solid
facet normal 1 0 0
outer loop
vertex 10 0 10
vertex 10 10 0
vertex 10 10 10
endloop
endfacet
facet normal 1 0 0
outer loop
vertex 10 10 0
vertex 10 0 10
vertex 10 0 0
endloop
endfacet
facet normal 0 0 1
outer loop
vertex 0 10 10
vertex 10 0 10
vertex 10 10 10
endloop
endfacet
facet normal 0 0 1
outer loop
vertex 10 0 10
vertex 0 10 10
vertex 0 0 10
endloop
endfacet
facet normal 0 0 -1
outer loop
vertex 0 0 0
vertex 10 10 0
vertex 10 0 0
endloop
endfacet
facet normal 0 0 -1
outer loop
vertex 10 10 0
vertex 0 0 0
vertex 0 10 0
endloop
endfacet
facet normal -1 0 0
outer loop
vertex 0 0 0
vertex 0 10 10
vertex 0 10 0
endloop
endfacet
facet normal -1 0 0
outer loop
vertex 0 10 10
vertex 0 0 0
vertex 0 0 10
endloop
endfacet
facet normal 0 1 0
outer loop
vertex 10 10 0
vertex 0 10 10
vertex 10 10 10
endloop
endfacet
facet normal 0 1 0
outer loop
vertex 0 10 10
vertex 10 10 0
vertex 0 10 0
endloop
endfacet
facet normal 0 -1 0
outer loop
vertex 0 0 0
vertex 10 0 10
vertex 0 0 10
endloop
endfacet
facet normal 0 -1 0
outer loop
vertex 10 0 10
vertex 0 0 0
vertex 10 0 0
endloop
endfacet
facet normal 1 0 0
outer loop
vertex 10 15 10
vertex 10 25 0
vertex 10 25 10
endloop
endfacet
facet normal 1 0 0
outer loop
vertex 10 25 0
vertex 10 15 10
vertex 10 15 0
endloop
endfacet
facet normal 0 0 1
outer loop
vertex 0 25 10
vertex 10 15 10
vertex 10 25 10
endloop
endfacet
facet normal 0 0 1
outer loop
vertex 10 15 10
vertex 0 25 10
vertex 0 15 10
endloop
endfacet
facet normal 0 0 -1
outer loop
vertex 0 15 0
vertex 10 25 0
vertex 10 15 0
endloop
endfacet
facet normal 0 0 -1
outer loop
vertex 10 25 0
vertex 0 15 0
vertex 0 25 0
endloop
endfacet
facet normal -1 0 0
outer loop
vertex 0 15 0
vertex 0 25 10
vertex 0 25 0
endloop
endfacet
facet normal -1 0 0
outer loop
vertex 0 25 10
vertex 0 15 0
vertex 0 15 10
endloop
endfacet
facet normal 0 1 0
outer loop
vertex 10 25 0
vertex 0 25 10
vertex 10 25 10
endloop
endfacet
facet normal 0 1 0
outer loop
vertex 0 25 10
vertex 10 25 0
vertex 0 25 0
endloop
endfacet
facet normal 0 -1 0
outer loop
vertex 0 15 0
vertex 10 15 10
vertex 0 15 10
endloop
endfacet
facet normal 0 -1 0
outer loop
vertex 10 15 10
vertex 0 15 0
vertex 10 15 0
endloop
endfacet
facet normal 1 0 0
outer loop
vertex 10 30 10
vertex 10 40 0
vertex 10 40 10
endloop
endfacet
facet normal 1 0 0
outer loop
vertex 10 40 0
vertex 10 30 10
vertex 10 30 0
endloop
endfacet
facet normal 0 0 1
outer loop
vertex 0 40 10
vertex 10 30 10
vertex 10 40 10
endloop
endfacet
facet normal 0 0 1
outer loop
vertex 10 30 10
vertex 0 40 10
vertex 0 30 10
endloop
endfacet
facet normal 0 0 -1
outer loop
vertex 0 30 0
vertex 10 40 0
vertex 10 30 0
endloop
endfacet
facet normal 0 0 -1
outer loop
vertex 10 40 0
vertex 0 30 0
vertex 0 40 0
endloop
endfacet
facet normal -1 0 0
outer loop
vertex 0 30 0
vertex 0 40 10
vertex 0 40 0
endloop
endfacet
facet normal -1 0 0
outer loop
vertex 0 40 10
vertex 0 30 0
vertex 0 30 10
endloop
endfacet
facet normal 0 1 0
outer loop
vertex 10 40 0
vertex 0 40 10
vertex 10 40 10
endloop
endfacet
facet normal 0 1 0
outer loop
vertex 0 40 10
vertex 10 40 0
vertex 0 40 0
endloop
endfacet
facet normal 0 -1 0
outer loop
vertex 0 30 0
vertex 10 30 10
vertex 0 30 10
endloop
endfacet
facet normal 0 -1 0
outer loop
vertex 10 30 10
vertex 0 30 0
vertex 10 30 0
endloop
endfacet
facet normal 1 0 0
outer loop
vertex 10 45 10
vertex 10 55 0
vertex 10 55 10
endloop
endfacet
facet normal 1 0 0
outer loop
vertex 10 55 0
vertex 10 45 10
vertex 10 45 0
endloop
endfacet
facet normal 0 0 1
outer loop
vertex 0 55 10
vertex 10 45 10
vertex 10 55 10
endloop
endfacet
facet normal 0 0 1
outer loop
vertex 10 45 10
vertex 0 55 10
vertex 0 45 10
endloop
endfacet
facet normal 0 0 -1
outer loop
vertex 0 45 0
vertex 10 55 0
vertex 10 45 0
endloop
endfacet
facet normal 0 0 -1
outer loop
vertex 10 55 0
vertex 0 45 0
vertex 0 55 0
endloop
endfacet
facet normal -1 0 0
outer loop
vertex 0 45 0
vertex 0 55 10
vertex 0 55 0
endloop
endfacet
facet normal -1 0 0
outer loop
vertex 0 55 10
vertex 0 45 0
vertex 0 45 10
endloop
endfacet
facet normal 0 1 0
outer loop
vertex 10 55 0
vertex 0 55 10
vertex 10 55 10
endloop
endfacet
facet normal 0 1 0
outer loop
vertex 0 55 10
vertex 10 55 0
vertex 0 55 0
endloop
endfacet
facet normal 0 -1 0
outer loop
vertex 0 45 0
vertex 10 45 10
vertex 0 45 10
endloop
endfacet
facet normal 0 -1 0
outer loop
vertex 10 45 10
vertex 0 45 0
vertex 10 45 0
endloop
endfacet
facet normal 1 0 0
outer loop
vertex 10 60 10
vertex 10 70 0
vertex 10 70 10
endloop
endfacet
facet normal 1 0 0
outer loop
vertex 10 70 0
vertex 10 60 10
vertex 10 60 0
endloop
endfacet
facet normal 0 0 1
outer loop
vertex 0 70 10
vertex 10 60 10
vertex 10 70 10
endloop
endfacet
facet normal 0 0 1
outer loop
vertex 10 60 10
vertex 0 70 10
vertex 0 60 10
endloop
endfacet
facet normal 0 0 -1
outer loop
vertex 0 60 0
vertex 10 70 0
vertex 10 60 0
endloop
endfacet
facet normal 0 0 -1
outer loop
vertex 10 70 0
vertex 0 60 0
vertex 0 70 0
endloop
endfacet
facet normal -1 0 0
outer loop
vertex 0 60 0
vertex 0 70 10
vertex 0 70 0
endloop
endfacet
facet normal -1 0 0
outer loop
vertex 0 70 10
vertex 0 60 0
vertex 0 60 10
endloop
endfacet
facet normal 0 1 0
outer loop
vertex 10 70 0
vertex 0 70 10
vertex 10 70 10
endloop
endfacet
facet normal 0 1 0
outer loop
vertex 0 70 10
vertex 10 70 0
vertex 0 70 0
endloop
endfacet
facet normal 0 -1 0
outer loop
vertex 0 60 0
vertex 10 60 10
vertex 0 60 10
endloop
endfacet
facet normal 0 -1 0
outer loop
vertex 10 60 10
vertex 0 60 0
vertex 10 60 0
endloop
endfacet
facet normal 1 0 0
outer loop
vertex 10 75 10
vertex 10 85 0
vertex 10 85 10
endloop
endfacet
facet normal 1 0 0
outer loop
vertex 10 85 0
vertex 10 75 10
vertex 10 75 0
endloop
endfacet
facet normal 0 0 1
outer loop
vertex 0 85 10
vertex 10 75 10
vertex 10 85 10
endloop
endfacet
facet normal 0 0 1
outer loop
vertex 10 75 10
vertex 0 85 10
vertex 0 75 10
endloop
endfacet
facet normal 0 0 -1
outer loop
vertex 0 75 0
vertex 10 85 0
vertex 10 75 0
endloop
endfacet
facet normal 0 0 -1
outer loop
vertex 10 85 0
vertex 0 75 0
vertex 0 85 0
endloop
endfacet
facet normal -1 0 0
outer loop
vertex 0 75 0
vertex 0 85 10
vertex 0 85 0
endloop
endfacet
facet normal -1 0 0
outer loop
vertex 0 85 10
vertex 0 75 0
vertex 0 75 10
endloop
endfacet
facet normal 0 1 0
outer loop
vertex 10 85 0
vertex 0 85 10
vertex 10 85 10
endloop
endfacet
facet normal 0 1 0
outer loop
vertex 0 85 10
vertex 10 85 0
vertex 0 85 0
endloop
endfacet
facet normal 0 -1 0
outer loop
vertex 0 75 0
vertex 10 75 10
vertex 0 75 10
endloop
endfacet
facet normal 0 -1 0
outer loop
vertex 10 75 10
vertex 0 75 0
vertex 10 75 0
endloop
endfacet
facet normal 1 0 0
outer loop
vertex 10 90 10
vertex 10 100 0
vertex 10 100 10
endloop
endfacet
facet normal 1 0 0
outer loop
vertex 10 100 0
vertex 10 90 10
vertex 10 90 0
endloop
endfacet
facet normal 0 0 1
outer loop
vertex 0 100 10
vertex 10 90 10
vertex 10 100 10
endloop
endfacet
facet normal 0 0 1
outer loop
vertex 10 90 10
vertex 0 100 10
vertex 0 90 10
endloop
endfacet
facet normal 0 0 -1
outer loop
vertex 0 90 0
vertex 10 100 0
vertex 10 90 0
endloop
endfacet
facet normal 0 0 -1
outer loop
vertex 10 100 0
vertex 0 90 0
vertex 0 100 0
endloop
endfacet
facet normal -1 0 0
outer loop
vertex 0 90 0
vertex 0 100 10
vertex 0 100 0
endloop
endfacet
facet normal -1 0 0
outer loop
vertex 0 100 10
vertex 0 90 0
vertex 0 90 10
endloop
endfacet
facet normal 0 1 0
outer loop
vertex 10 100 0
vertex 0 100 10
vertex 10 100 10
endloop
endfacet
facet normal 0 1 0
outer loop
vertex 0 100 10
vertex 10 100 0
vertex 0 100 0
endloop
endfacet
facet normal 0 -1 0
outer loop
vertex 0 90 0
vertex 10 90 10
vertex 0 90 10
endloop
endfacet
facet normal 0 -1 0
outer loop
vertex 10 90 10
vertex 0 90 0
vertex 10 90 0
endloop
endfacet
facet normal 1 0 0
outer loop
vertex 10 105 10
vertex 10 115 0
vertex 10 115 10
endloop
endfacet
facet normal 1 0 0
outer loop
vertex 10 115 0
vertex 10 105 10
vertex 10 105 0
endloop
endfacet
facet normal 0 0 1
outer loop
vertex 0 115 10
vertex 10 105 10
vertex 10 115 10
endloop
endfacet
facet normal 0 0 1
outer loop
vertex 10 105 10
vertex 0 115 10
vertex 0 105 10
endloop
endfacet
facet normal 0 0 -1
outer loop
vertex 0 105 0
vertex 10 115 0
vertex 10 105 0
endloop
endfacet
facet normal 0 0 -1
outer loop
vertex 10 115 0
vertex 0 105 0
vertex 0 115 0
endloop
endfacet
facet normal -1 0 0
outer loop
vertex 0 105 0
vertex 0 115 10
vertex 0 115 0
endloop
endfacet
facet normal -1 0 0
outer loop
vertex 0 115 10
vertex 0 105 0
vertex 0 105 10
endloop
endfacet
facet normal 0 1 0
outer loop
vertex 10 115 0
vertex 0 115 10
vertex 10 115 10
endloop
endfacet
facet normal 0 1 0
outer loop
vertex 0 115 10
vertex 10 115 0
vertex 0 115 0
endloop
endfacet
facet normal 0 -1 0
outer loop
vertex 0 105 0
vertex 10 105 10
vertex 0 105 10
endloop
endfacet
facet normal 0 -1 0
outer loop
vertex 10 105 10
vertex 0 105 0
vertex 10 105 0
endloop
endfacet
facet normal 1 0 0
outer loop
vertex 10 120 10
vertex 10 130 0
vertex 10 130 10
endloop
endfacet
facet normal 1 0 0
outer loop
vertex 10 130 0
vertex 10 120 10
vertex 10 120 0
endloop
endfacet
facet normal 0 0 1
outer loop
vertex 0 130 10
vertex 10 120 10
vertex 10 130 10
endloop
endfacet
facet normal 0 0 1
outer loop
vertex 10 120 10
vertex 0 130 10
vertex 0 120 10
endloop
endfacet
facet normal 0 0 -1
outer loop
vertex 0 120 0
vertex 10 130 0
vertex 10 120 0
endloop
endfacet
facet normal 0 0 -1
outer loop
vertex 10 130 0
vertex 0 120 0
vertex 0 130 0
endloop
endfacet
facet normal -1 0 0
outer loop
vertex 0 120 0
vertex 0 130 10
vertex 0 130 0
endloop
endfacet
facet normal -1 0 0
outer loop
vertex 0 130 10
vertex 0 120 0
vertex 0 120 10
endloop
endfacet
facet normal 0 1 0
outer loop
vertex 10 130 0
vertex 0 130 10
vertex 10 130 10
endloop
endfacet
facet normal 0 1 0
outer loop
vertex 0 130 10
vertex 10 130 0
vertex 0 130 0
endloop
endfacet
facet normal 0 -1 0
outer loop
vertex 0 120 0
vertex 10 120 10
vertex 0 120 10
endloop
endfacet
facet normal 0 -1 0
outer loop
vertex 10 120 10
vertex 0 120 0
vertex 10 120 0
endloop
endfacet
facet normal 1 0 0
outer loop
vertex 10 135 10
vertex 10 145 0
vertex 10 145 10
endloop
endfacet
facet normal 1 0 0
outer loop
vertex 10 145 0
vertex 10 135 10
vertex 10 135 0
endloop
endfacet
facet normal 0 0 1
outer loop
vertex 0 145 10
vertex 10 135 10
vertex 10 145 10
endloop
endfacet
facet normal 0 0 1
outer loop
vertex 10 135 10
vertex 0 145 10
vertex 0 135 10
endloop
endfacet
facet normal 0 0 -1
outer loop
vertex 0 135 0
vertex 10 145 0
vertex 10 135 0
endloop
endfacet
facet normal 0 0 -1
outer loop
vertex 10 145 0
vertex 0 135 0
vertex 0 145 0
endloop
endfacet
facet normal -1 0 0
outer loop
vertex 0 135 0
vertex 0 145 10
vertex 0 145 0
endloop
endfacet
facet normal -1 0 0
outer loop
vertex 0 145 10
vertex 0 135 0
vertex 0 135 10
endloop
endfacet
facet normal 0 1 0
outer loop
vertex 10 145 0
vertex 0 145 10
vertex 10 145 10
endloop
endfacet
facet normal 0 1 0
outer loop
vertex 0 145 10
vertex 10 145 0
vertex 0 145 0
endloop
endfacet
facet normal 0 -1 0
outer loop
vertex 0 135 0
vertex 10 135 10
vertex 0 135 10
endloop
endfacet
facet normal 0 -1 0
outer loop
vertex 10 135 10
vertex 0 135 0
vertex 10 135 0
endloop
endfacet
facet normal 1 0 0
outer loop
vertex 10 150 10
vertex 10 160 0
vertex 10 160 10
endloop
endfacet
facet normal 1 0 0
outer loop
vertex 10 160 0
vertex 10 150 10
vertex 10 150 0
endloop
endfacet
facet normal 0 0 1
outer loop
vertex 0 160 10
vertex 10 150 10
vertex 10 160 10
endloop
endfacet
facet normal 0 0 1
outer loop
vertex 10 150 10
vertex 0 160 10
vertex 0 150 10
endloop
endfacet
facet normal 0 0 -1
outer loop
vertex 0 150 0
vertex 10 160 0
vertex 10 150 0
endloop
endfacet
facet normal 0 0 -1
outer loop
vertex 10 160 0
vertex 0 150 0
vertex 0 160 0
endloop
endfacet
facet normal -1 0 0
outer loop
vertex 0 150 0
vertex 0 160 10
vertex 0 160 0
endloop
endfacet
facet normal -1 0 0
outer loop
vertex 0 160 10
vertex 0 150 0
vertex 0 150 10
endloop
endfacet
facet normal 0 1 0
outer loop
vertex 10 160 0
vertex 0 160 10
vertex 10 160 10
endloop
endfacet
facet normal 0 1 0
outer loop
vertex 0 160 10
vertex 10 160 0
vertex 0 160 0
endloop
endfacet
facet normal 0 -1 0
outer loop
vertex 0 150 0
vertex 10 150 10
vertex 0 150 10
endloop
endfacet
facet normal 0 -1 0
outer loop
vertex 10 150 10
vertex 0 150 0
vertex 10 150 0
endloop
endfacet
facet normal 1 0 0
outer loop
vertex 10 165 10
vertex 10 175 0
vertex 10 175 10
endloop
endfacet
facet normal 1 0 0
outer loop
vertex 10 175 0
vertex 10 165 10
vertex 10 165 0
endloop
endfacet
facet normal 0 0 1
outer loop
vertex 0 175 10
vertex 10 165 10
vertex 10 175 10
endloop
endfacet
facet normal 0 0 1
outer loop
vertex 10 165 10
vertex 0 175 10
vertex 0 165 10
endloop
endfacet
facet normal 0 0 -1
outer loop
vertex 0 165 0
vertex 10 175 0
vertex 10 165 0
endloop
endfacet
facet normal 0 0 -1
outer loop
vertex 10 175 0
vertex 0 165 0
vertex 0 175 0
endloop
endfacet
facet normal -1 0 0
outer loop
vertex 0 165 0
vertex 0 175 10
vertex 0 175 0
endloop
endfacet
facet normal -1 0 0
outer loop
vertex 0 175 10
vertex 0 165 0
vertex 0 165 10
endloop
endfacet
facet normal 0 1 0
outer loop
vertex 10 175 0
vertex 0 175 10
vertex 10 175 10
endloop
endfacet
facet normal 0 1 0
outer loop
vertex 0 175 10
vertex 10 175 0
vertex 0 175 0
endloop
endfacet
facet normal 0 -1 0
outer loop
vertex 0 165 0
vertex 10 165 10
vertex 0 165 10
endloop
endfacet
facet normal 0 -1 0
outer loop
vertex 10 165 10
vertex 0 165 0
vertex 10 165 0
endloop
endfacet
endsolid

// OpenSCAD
// color scheme generator
// use customizer to select colors
// switch between perspective and 3d anaglyph to see what the colors look like
// copy and paste console output to /usr/share/openscad/color-schemes/render/redcyanglasses.json

// customizer variables

light_hue = 75; // [45:105]
dark_hue = 285; // [255:315]
saturation = 95; // [0:100]
dark_scheme = false;

module __end_of_customizer_variables__ () {}  // marks end of customizer variables

hue_front = dark_scheme ? dark_hue : light_hue;
hue_back = dark_scheme ? light_hue : dark_hue;
lightness_background = dark_scheme ? 0 : 100;

// color scheme.
// parameters to hsv_deg are hue [0:360], saturation [0:100] and value [0:100]

background         = hsv_deg(0, 0, lightness_background);
highlight          = hsv_deg(hue_back,saturation,100);
axes_color         = hsv_deg(hue_back,saturation,100);
opencsg_face_front = hsv_deg(hue_front,saturation,100);
opencsg_face_back  = hsv_deg(hue_back,saturation,100);
cgal_face_front    = hsv_deg(hue_front,saturation,100);
cgal_face_back     = hsv_deg(hue_back,saturation,100);
cgal_face_2d       = hsv_deg(hue_front,saturation,100);
cgal_edge_front    = hsv_deg(hue_back,saturation,100);
cgal_edge_back     = hsv_deg(hue_back,saturation,100);
cgal_edge_2d       = hsv_deg(hue_back,saturation,100);
crosshair          = hsv_deg(hue_back,saturation,100);

// set viewport
$vpt=[68, 88, 5];
$vpr=[0, 0, 0];
$vpd=550;

function hsv_deg(h, s, v) = hsv(h/360,s/100,v/100, 1);
function hsv(h, s = 1, v = 1, a = 1, p, q, t) = (p == undef || q == undef || t == undef) // by LightAtPlay
	? hsv(
		(h%1) * 6,
		s<0?0:s>1?1:s,
		v<0?0:v>1?1:v,
		a,
		(v<0?0:v>1?1:v) * (1 - (s<0?0:s>1?1:s)),
		(v<0?0:v>1?1:v) * (1 - (s<0?0:s>1?1:s) * ((h%1)*6-floor((h%1)*6))),
		(v<0?0:v>1?1:v) * (1 - (s<0?0:s>1?1:s) * (1 - ((h%1)*6-floor((h%1)*6))))
	)
	:
	h < 1 ? [v,t,p,a] :
	h < 2 ? [q,v,p,a] :
	h < 3 ? [p,v,t,a] :
	h < 4 ? [p,q,v,a] :
	h < 5 ? [t,p,v,a] :
	        [v,p,q,a];

hexchars="0123456789ABCDEF";
function hex(a) = str(hexchars[(a / 16) % 16] , hexchars[a % 16]);
function color_to_hex(c) = str(hex(c[0]*255), hex(c[1]*255), hex(c[2]*255));

cs = str(
    "copy and paste to redcyanglasses.json:\n",
    "{\n",
    "    \"name\" : \"3D Glasses\",\n",
    "    \"index\" : 2001,\n",
    "    \"show-in-gui\" : true,\n",
    "    \"description\" : \"3d anaglyph\",\n",
    "    \"_comment\" : \"created by colorscheme.scad, ", dark_scheme ? "dark" : "light", " scheme, light hue ", str(light_hue), ", dark hue ", str(dark_hue), ", saturation ", str(saturation), "\",\n",
    "\n",
    "    \"colors\" : {\n",
    "        \"background\" :         \"#", color_to_hex(background), "\",\n",
    "        \"highlight\" :          \"#", color_to_hex(highlight), "80\",\n",
    "        \"axes-color\" :         \"#", color_to_hex(axes_color), "\",\n",
    "        \"opencsg-face-front\" : \"#", color_to_hex(opencsg_face_front), "\",\n",
    "        \"opencsg-face-back\" :  \"#", color_to_hex(opencsg_face_back), "\",\n",
    "        \"cgal-face-front\" :    \"#", color_to_hex(cgal_face_front), "\",\n",
    "        \"cgal-face-back\" :     \"#", color_to_hex(cgal_face_back), "\",\n",
    "        \"cgal-face-2d\" :       \"#", color_to_hex(cgal_face_2d), "\",\n",
    "        \"cgal-edge-front\" :    \"#", color_to_hex(cgal_edge_front), "\",\n",
    "        \"cgal-edge-back\" :     \"#", color_to_hex(cgal_edge_back), "\",\n",
    "        \"cgal-edge-2d\" :       \"#", color_to_hex(cgal_edge_2d), "\",\n",
    "        \"crosshair\" :          \"#", color_to_hex(crosshair), "\"\n",
    "    }\n",
    "}\n"
    );
    
echo(cs);    

// display colors

colors = [
    background,
    highlight,
    axes_color,
    opencsg_face_front,
    opencsg_face_back,
    cgal_face_front,
    cgal_face_back,
    cgal_face_2d,
    cgal_edge_front,
    cgal_edge_back,
    cgal_edge_2d,
    crosshair];
    
names = [
    "background",
    "highlight",
    "axes_color",
    "opencsg_face_front",
    "opencsg_face_back",
    "cgal_face_front",
    "cgal_face_back",
    "cgal_face_2d",
    "cgal_edge_front",
    "cgal_edge_back",
    "cgal_edge_2d",
    "crosshair"];
  
for (i = [0:len(colors)-1]) {
    translate([0, i*15, 0])
    color(colors[i])
    cube(10);
    translate([15, i*15, 0])
    text(names[i], valign = "bottom");
}

// not truncated
